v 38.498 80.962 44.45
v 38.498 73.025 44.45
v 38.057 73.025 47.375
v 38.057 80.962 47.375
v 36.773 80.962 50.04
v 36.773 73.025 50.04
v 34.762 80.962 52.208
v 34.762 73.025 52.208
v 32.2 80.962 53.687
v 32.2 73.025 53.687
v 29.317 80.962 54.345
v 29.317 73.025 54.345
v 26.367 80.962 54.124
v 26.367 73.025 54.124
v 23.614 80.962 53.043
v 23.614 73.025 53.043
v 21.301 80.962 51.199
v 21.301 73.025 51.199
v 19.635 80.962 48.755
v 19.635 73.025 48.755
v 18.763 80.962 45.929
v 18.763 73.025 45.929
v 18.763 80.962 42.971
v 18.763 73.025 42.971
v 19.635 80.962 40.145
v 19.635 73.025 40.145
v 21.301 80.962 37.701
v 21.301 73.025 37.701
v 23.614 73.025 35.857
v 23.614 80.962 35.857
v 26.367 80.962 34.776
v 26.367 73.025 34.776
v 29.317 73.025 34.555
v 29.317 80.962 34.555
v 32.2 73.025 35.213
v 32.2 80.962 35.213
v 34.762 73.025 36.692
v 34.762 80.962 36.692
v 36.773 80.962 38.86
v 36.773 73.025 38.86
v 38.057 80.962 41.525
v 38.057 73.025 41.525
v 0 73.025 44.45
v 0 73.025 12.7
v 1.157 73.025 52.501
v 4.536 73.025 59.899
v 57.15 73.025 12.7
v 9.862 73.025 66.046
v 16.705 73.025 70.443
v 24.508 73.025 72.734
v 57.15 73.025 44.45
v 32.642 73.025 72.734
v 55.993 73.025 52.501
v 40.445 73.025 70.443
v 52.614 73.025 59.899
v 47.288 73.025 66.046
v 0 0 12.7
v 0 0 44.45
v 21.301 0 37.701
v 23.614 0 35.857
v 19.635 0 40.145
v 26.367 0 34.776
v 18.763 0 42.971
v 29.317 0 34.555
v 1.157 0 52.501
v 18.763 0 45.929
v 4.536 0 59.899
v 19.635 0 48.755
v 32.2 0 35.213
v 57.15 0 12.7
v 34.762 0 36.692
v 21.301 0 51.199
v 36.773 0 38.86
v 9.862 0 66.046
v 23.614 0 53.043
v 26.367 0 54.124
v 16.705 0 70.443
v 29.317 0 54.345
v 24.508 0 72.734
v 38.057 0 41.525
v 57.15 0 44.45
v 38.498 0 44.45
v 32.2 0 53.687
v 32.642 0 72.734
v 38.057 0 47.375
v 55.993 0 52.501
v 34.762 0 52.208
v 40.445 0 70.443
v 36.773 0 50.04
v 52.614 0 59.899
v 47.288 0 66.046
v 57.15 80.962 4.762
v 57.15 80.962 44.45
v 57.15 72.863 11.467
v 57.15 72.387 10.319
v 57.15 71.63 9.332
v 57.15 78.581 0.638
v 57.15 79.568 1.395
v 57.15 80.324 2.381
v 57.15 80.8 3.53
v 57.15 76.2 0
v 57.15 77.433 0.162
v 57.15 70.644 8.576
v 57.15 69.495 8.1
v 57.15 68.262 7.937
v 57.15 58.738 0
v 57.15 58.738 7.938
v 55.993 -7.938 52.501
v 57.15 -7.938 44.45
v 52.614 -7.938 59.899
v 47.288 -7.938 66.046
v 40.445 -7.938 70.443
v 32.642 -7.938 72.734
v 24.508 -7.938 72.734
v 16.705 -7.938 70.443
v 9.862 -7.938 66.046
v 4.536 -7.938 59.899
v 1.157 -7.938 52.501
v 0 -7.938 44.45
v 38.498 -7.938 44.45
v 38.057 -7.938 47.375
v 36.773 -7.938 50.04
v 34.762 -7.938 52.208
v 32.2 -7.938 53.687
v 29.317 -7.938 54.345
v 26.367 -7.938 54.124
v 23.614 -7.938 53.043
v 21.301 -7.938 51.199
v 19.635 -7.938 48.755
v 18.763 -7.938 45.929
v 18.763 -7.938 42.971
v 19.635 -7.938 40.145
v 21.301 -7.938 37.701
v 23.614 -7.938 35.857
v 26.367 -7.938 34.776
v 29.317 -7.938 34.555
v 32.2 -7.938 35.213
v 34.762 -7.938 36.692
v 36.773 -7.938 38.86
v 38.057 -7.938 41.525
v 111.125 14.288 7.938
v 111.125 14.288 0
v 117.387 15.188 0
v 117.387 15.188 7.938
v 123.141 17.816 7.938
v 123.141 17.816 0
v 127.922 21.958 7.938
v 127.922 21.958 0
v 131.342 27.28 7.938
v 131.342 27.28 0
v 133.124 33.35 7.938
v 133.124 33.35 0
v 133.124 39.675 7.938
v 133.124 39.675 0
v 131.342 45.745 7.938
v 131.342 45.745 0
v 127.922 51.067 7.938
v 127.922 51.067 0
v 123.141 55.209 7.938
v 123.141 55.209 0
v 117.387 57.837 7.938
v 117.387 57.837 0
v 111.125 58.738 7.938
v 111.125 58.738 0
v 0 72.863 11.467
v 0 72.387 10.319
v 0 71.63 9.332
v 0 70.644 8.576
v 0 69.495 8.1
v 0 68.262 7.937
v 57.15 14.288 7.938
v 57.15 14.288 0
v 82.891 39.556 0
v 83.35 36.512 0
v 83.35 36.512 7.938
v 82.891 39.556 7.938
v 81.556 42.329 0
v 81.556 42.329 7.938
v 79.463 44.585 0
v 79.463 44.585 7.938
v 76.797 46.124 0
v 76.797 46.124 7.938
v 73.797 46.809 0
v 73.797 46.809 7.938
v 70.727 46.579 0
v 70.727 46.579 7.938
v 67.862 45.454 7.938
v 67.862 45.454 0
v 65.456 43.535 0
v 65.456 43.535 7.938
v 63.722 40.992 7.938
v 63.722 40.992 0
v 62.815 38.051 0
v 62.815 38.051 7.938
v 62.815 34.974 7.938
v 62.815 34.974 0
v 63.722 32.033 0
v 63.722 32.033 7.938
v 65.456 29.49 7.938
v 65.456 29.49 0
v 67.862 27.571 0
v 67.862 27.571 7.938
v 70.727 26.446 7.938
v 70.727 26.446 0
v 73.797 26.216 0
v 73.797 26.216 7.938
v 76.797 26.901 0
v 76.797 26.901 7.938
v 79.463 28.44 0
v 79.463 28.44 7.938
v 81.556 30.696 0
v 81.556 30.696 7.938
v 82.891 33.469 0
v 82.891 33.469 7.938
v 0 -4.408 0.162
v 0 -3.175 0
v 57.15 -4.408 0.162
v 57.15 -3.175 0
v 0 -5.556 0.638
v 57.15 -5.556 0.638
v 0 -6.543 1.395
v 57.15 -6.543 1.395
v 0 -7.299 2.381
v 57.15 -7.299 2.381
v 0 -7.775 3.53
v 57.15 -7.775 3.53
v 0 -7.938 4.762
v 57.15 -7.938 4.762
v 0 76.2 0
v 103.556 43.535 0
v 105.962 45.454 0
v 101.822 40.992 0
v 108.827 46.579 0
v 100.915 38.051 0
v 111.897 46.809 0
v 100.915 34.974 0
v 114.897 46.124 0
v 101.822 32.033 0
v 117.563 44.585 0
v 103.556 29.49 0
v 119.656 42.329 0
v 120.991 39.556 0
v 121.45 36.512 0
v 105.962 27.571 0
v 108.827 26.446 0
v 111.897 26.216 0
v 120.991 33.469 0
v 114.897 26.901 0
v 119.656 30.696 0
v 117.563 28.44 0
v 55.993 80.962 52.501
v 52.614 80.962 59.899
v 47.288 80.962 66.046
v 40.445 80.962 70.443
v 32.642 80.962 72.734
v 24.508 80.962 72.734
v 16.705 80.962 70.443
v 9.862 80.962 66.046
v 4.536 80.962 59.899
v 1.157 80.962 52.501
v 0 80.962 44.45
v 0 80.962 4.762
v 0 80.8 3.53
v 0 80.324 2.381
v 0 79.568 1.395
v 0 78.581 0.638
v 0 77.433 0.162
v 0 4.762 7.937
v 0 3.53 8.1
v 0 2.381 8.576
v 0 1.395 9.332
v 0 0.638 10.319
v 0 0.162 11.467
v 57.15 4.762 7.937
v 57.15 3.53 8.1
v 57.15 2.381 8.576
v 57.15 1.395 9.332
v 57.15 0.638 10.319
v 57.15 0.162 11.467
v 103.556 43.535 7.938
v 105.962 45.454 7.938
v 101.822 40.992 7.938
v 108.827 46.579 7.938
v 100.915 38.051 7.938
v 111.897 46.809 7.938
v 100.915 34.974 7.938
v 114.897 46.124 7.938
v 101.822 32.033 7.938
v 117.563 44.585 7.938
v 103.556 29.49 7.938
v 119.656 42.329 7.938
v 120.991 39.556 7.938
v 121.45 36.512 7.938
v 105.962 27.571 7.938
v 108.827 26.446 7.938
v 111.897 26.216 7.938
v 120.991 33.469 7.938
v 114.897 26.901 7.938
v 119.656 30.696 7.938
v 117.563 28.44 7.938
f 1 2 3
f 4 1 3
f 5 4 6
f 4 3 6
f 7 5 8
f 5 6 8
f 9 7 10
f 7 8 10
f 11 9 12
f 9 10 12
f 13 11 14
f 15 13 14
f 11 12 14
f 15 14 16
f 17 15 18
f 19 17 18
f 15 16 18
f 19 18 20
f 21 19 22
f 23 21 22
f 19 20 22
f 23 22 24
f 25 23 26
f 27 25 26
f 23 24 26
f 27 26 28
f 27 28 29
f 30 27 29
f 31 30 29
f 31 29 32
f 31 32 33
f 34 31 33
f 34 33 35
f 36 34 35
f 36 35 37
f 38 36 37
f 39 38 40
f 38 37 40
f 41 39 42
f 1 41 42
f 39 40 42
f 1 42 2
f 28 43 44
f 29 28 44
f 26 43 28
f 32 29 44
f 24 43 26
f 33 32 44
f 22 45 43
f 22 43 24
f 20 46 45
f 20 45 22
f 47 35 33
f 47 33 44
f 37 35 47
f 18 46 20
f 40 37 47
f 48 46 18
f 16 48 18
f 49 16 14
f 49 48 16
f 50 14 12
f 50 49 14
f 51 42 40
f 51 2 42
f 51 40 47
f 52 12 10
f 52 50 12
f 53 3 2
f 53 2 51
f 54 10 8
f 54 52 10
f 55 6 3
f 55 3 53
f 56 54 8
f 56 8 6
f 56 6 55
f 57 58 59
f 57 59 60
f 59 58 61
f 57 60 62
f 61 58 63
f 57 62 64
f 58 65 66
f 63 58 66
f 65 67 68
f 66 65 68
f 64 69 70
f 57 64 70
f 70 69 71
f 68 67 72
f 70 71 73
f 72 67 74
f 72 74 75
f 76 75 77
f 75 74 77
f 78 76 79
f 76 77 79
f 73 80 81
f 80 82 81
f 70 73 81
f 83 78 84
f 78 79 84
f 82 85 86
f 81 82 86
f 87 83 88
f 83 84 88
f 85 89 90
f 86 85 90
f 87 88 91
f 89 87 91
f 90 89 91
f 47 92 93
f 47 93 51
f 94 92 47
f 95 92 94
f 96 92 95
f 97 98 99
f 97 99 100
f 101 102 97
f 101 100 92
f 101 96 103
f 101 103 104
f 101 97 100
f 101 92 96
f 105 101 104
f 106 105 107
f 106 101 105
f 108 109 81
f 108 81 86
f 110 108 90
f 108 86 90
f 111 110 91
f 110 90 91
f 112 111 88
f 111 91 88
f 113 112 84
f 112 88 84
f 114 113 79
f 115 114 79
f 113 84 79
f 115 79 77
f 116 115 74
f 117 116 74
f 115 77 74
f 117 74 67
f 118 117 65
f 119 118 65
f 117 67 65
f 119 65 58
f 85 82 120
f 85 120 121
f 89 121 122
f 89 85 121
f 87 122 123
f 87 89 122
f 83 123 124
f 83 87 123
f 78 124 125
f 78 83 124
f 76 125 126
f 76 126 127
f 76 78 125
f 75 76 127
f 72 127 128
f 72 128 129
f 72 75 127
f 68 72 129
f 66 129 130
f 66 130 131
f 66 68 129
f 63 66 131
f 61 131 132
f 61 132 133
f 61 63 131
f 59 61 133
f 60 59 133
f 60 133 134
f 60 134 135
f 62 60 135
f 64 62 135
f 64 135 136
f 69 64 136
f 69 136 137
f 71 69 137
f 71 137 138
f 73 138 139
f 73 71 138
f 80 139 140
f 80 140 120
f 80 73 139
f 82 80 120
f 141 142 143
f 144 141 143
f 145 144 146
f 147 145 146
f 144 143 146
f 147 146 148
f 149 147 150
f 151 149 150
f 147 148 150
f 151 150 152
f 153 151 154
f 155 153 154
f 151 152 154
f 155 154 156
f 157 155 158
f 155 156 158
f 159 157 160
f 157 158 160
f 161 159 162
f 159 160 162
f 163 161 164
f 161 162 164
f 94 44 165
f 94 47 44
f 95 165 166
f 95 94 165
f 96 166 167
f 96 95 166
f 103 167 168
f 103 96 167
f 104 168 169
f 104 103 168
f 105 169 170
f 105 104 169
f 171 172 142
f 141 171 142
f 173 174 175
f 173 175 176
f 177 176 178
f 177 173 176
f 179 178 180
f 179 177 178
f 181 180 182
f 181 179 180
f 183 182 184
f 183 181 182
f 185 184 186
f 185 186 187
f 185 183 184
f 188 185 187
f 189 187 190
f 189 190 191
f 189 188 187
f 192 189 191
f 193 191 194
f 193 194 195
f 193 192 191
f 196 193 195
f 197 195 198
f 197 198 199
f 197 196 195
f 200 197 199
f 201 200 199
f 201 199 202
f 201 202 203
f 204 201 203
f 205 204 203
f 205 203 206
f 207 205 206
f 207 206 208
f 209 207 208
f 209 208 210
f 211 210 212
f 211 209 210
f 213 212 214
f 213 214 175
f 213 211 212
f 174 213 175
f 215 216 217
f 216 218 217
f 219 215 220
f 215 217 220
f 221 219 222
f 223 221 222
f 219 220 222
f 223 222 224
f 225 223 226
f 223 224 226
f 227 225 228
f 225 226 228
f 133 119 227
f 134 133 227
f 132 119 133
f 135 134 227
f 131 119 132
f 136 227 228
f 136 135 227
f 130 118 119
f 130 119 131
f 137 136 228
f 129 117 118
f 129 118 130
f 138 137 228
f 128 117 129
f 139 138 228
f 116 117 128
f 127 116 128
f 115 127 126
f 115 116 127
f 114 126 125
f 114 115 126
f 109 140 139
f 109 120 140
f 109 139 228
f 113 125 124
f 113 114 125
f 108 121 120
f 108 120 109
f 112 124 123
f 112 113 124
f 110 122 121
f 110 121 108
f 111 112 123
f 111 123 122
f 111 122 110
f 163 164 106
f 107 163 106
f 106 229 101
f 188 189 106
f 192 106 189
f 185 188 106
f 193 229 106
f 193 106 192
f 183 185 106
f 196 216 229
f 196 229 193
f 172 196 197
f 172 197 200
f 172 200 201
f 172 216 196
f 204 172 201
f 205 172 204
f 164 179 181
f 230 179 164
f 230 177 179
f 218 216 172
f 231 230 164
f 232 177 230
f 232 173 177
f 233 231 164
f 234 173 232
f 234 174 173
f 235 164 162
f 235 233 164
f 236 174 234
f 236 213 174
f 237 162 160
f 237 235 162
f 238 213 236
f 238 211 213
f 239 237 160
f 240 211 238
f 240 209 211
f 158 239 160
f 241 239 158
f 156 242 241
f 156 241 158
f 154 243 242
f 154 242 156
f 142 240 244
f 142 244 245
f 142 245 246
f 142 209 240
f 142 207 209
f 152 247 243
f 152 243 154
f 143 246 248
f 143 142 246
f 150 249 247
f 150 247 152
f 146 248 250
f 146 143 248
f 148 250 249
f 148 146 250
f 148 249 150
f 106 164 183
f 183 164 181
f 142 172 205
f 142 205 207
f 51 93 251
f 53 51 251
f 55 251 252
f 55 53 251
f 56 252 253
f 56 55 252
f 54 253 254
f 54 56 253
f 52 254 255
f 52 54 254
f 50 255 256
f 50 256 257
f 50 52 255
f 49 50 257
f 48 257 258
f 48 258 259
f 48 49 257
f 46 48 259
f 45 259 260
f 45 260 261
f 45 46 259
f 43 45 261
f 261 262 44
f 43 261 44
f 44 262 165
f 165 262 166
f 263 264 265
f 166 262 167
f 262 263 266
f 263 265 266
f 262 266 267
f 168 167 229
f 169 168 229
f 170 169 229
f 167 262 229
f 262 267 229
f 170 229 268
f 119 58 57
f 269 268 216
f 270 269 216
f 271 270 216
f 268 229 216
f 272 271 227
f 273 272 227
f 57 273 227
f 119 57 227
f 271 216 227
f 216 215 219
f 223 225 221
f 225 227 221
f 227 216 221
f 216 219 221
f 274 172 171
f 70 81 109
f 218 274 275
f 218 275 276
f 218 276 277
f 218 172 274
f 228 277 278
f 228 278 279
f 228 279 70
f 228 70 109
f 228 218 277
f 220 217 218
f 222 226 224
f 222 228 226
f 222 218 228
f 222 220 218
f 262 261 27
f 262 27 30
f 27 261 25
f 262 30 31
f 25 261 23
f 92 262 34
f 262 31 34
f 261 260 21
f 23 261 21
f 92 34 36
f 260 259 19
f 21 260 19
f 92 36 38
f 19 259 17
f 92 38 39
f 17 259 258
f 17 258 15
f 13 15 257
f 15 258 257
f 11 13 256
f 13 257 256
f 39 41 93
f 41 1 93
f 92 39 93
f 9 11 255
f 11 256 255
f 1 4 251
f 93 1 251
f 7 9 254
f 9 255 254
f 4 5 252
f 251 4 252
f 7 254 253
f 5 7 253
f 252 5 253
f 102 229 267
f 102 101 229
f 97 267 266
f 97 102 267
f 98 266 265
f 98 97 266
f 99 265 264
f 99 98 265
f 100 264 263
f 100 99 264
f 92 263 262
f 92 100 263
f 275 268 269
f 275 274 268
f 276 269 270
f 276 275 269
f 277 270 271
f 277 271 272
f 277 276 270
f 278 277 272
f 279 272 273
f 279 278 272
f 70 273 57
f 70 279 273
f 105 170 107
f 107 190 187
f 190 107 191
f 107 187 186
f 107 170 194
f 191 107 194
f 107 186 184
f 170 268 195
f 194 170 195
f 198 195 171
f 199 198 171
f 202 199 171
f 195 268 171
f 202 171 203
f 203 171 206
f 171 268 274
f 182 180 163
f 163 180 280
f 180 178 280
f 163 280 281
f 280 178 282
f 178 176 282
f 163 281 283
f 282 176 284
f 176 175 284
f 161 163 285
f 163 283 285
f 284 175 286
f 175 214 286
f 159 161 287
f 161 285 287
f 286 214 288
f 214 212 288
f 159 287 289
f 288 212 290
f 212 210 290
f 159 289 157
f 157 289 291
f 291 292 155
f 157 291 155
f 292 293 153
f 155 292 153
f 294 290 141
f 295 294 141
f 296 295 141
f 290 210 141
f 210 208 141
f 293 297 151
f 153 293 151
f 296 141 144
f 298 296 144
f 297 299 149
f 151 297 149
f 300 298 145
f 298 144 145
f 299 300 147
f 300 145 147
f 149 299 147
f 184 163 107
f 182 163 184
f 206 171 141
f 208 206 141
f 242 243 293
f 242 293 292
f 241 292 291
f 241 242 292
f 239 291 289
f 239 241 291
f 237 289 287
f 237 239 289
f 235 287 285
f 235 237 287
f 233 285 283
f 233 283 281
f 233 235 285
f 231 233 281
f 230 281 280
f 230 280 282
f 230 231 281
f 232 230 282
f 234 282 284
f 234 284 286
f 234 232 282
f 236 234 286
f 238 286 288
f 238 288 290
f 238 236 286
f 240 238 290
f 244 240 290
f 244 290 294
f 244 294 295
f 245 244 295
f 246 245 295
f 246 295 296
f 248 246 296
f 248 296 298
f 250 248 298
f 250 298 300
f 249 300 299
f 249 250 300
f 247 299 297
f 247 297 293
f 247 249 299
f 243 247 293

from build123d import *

# Parameters (mm, degrees)
F0_R     = 9.92251
F1_DEPTH = 7.9375
F2_W     = 57.15
F2_H     = 36.5125
F3_DEPTH = 7.9375
F5_R     = 10.3251
F6_DEPTH = 7.9375
F7_R     = 4.7625


with BuildPart() as f1:
    # F0 (on Front) → F1 (new body)
    with BuildSketch(Plane.XZ):
        with BuildLine():
            Line((0, 44.45), (0, 0))
            Line((0, 0), (57.15, 0))
            Line((57.15, 0), (57.15, 44.45))
            ThreePointArc((57.15, 44.45), (28.575, 73.025), (0, 44.45))
        make_face()
        with Locations((28.575, 44.45)):
            Circle(F0_R, mode=Mode.SUBTRACT)
    extrude(amount=F1_DEPTH)

    # F2 (on Top) → F3 (join)
    with BuildSketch(Plane.XY):
        with Locations((28.575, 18.25625)):
            Rectangle(F2_W, F2_H)
    extrude(amount=F3_DEPTH)

    # F4: F1 across face


with BuildPart() as f1_1:
    add(f1.part)
    add(f1.part.mirror(Plane(origin=(28.575, 36.5125, 3.96875), x_dir=(-1, 0, 0), z_dir=(0, 1, 0))))

    # F5 (on Top) → F6 (join)
    with BuildSketch(Plane.XY):
        with BuildLine():
            Line((57.15, 58.7375), (57.15, 14.2875))
            Line((57.15, 14.2875), (111.125, 14.2875))
            ThreePointArc((111.125, 14.2875), (133.35, 36.5125), (111.125, 58.7375))
            Line((111.125, 58.7375), (57.15, 58.7375))
        make_face()
        with Locations((73.025, 36.5125)):
            Circle(F5_R, mode=Mode.SUBTRACT)
        with Locations((111.125, 36.5125)):
            Circle(F5_R, mode=Mode.SUBTRACT)
    extrude(amount=F6_DEPTH)

    # F7
    f7_edges = [f1_1.edges().sort_by_distance(p)[0] for p in [
        (28.575, 73.025, 7.9375),
        (28.575, 0, 7.9375),
        (28.575, -7.9375, 0),
        (28.575, 80.9625, 0),
    ]]
    fillet(f7_edges, radius=F7_R)


solid = f1_1.part
